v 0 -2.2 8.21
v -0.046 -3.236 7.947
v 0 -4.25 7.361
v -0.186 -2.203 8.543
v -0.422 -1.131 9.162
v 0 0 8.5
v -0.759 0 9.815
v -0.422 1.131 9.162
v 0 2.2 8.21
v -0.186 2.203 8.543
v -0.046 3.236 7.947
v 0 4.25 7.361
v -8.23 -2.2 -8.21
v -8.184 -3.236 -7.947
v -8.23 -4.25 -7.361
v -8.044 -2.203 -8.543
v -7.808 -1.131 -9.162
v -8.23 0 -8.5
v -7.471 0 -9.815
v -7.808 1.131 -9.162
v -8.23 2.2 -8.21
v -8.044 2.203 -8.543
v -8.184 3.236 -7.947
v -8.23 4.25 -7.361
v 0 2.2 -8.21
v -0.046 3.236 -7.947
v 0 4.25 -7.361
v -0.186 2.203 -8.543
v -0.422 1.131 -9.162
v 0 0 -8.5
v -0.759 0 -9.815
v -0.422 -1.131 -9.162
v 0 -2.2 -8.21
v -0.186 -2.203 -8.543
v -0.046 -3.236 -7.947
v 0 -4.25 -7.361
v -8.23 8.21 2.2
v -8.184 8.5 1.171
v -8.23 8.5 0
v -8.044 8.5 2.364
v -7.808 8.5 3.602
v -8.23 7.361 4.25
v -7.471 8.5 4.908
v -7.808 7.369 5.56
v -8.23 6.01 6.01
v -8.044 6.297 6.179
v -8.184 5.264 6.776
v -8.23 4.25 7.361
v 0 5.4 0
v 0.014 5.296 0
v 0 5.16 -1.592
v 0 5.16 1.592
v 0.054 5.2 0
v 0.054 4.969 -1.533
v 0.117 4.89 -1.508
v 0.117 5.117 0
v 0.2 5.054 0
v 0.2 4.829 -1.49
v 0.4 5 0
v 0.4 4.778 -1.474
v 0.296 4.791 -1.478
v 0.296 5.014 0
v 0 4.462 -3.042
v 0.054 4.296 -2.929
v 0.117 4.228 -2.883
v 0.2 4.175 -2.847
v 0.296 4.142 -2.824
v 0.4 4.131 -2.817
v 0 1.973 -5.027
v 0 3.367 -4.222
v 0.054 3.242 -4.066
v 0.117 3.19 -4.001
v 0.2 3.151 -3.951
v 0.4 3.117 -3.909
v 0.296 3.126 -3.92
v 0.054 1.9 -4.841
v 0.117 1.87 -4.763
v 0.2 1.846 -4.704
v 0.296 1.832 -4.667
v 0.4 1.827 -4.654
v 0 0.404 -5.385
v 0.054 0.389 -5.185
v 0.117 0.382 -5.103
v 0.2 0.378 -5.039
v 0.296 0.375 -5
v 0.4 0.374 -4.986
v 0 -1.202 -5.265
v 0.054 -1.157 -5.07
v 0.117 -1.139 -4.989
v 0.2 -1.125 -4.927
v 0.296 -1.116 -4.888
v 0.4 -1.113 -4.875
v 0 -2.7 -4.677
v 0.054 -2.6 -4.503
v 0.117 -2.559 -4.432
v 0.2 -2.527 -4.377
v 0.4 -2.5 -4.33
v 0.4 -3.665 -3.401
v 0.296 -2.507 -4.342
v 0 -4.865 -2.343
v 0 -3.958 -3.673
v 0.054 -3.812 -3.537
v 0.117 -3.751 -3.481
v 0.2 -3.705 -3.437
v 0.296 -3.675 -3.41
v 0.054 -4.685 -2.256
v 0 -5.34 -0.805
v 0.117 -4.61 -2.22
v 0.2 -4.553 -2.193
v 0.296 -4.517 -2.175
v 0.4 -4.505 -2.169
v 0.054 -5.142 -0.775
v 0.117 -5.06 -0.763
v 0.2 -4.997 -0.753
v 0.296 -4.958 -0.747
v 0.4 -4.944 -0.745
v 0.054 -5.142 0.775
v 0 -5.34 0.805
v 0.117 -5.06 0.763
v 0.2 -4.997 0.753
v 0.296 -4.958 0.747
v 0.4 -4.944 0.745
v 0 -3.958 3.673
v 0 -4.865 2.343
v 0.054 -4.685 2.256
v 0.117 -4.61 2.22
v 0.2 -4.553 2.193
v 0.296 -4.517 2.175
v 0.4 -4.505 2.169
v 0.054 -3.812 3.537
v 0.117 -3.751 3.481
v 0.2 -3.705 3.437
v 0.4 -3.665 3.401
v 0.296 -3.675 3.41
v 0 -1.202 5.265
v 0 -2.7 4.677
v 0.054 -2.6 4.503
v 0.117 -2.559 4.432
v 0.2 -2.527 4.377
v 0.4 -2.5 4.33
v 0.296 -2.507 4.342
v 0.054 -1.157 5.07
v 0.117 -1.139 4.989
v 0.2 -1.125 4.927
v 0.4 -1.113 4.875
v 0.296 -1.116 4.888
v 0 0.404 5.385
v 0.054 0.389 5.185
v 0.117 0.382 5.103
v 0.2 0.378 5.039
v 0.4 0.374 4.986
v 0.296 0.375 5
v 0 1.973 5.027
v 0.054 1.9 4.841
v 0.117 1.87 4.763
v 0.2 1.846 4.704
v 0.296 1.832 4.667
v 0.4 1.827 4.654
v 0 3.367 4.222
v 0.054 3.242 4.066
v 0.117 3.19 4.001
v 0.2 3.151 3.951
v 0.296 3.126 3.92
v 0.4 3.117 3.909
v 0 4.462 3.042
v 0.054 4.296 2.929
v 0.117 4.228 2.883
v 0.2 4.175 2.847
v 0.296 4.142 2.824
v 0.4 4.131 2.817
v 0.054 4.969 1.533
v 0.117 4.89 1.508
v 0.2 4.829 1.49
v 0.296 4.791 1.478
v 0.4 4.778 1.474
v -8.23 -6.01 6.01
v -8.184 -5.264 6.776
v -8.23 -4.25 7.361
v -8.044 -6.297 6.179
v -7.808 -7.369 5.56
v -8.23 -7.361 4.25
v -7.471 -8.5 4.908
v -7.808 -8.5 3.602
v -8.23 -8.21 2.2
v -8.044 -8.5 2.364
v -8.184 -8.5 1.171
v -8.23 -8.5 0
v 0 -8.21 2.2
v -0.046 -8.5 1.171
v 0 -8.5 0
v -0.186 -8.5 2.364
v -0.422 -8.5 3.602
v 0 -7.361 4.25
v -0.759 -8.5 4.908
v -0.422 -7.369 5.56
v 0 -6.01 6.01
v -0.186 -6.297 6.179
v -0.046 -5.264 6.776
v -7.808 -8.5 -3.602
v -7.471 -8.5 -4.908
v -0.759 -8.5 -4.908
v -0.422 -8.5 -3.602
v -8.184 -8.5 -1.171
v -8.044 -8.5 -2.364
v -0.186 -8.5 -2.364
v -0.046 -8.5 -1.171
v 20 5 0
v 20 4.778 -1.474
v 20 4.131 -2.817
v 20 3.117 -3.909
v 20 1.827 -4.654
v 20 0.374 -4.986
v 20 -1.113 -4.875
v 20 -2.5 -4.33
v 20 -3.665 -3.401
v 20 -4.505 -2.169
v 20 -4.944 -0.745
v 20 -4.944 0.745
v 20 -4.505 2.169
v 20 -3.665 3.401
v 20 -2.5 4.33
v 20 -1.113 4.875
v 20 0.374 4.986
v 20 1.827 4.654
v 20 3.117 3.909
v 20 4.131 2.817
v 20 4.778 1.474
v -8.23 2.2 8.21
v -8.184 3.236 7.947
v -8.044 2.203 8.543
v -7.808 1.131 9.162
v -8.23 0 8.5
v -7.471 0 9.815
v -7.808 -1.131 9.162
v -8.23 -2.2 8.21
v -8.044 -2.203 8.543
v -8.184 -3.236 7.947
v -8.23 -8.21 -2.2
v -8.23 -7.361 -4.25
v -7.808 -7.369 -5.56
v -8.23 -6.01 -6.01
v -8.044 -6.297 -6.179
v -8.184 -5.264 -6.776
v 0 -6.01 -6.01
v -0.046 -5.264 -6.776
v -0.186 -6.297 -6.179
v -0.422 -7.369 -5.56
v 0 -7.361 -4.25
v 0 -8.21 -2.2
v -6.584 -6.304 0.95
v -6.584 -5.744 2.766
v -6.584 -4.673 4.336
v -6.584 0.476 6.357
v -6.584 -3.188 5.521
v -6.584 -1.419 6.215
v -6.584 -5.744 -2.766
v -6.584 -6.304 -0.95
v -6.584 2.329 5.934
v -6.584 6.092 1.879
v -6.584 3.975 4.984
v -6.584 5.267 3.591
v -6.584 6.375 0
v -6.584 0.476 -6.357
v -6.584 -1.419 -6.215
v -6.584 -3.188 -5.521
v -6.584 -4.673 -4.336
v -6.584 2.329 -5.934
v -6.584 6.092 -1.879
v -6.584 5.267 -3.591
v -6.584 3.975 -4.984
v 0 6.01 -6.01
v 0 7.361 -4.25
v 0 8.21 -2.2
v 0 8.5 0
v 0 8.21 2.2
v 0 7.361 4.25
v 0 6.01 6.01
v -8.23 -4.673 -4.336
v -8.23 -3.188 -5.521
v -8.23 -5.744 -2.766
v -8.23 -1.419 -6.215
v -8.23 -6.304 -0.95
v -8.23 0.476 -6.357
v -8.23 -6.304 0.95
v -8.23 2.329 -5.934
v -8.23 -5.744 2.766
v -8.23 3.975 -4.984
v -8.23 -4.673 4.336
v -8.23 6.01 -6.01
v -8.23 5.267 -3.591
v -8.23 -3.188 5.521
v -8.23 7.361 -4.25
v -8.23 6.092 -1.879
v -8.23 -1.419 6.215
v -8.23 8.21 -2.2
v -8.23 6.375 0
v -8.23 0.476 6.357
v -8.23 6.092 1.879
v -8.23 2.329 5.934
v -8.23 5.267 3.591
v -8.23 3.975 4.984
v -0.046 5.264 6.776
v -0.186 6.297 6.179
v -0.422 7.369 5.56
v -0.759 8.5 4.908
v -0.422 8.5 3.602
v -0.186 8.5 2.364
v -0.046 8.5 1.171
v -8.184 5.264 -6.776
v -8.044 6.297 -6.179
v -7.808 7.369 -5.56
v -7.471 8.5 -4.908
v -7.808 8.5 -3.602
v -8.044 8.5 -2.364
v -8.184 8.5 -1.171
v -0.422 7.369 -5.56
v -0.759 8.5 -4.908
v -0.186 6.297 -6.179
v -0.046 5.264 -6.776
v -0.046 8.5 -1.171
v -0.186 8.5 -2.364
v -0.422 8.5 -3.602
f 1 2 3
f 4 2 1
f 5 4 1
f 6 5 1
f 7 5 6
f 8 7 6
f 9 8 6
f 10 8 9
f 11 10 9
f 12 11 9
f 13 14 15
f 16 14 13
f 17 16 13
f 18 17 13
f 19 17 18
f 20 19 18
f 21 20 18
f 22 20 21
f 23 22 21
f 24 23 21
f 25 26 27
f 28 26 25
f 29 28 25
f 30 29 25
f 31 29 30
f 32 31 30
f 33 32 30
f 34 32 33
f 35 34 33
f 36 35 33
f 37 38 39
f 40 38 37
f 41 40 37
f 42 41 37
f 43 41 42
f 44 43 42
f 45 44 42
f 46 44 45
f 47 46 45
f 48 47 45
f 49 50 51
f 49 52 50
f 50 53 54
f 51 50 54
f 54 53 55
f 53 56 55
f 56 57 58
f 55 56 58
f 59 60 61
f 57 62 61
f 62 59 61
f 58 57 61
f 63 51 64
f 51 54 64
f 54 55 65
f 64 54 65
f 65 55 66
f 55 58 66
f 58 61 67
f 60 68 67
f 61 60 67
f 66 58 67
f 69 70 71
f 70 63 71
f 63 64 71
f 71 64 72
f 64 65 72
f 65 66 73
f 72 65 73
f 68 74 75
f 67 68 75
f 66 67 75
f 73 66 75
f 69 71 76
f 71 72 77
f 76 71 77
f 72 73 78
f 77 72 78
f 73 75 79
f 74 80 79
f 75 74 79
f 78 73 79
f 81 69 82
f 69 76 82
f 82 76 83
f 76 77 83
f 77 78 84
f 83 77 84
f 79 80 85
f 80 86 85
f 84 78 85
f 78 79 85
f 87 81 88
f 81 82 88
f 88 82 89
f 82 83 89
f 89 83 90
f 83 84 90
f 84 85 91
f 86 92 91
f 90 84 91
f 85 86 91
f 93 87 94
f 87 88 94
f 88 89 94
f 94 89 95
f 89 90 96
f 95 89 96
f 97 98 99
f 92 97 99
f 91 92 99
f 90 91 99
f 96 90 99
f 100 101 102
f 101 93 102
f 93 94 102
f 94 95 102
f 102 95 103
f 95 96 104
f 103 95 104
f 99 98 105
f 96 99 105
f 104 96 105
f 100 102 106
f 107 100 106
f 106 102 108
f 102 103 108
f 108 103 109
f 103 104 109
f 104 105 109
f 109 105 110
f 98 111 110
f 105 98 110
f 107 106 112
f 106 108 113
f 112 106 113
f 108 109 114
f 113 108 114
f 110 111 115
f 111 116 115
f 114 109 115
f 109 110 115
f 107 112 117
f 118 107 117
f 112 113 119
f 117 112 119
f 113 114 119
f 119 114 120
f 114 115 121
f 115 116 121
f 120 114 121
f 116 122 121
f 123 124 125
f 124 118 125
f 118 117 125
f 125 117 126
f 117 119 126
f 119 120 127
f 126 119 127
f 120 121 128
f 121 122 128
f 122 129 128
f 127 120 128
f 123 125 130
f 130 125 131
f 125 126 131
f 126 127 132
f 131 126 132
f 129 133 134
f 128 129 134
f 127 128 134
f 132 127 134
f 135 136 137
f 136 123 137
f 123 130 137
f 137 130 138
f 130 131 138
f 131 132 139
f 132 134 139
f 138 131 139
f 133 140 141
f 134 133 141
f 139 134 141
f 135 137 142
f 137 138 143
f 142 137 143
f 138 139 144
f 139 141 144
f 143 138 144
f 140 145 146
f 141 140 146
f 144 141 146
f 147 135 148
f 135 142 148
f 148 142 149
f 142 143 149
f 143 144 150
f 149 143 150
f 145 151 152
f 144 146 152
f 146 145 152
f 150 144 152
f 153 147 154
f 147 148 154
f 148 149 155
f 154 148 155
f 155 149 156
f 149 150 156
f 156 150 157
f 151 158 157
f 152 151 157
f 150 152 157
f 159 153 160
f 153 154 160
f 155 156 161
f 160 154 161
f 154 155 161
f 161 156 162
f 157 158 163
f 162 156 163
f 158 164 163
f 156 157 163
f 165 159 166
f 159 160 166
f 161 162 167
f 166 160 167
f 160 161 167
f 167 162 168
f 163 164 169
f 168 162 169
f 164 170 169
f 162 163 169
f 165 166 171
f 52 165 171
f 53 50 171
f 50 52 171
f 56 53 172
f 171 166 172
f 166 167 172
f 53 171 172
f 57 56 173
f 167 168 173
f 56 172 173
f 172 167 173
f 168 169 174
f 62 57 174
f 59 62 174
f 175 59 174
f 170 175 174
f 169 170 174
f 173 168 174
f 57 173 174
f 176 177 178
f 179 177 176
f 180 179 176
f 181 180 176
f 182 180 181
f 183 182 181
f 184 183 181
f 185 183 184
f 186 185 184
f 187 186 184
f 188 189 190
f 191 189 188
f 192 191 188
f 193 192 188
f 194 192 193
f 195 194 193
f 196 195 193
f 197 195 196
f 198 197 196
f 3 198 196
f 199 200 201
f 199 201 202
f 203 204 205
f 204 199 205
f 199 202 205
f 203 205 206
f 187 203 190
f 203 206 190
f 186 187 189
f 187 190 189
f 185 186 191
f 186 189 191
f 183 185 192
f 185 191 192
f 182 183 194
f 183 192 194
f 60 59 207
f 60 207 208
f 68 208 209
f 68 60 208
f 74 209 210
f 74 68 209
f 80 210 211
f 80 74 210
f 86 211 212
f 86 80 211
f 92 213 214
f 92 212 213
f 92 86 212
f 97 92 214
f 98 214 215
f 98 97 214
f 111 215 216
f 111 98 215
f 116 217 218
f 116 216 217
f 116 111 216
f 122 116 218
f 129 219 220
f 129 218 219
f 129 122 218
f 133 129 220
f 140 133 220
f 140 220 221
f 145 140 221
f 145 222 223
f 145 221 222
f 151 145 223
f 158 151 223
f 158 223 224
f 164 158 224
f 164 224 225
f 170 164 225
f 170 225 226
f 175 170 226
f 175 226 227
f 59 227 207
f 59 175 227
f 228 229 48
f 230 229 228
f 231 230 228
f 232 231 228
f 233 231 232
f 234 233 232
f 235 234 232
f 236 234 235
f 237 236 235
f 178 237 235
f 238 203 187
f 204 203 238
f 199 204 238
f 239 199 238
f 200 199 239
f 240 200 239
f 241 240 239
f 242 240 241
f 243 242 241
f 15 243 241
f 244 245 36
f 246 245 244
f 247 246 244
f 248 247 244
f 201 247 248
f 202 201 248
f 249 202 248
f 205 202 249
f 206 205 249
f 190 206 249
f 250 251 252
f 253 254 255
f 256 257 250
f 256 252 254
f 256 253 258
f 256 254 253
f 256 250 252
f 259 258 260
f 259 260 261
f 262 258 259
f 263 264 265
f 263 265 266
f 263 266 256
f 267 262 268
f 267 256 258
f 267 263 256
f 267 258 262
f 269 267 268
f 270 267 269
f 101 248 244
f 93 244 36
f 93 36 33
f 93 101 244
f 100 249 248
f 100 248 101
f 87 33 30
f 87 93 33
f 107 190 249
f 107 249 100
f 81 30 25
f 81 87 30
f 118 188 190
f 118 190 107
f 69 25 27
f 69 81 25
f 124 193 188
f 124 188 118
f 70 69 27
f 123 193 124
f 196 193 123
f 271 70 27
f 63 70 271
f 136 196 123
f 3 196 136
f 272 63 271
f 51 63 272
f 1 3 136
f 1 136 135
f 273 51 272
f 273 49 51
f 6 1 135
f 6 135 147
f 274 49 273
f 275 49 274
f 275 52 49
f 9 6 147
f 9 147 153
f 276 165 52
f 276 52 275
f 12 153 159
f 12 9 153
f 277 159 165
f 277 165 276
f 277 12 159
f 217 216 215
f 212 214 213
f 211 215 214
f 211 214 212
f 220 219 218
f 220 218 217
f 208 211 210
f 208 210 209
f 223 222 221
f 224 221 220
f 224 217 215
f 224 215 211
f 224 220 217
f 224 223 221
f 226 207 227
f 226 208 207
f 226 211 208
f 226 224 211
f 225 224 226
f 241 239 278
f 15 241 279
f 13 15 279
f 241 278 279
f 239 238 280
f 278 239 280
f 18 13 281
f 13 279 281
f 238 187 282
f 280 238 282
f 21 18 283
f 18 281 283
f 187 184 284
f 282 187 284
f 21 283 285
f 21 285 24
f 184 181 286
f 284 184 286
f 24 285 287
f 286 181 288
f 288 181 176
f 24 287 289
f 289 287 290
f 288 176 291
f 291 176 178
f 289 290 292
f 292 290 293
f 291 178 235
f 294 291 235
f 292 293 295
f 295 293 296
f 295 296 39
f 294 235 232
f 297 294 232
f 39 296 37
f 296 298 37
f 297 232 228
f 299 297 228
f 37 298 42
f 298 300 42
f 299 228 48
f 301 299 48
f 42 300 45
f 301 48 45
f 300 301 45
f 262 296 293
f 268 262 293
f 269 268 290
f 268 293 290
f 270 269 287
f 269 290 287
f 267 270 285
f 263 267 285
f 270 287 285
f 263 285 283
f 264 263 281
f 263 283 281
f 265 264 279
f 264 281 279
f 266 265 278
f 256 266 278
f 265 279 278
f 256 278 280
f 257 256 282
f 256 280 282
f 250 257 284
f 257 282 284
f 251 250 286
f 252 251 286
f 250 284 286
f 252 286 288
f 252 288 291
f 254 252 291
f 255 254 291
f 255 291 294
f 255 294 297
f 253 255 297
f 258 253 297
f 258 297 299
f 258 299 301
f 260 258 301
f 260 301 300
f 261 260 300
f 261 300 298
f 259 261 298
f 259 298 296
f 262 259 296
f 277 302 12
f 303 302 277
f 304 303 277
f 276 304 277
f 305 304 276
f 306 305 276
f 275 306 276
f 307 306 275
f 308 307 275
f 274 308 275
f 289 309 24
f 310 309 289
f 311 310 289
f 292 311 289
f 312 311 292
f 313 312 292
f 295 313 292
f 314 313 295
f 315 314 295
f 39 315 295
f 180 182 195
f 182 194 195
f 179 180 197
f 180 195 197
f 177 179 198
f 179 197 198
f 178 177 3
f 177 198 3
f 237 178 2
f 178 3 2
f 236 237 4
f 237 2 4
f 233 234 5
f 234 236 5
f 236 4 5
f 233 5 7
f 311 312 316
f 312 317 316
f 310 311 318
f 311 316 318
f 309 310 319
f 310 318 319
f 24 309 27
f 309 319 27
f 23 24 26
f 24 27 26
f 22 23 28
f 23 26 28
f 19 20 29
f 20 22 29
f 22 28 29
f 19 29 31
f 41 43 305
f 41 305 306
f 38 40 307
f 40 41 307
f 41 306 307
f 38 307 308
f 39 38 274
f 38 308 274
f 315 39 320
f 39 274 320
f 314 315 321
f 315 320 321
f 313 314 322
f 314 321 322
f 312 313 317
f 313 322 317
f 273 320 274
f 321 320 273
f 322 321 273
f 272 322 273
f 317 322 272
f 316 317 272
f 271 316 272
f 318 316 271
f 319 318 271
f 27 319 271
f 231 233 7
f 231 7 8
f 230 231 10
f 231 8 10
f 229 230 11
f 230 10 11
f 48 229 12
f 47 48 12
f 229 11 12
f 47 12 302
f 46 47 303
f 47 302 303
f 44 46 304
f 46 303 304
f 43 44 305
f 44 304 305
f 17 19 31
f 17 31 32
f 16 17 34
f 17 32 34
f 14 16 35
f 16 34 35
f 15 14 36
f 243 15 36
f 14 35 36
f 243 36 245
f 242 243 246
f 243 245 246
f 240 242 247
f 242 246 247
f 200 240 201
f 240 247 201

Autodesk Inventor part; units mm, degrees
ref_plane "YZ Plane" through (0, 0, 0) normal (1, 0, 0) x (0, 1, 0)
ref_plane "XZ Plane" through (0, 0, 0) normal (0, 1, 0) x (-1, 0, 0)
sketch "Sketch1" plane through (0, 0, 0) normal (0, 0, 1) x (1, 0, 0)
  line L0 (0, 5) -> (0, 0)
  line L1 (0, 0) -> (20, 0)
  line L2 (20, 0) -> (20, 5)
  line L3 (20, 5) -> (0, 5)
  line L4 (-4, 0) -> (24, 0) projected
  line L5 (0, -1) -> (0, 6) projected
  dimension "d0" = 10
  dimension "d1" = 20
revolve "Body" add sketch "Sketch1" angle 360 about axis through (0, 0, 0) along (1, 0, 0)
sketch "Sketch2" plane through (0, 0, 0) normal (1, 0, 0) x (0, 1, 0)
  line L0 (0, 9.815) -> (8.5, 4.9075)
  line L1 (8.5, 4.9075) -> (8.5, -4.9075)
  line L2 (8.5, -4.9075) -> (0, -9.815)
  line L3 (0, -9.815) -> (-8.5, -4.9075)
  line L4 (-8.5, -4.9075) -> (-8.5, 4.9075)
  line L5 (-8.5, 4.9075) -> (0, 9.815)
  line L6 (-11.9, 0) -> (11.9, 0) projected
  line L7 (0, -13.7409) -> (0, 13.7409) projected
  point P0 (0, 0)
  point P1 (0, 0)
  dimension "d2" = 17
extrude "Head" add sketch "Sketch2" against normal blind 8.23
sketch "Sketch3" plane through (-8.23, 0, 0) normal (-1, 0, 0) x (0, 1, 0)
  circle A0 centre (0, 0) radius 6.375
  point P0 (0, 0)
  dimension "d12" = 12.75
extrude "Indent1" cut sketch "Sketch3" against normal blind 1.646
sketch "Sketch4" plane through (0, 0, 0) normal (0, 0, 1) x (1, 0, 0)
  line L0 (-8.23, 9.815) -> (-8.23, 8.5)
  line L1 (-8.23, 8.5) -> (-7.4708, 9.815)
  line L2 (-7.4708, 9.815) -> (-8.23, 9.815)
  line L3 (0, 9.815) -> (0, 8.5)
  line L4 (0, 8.5) -> (-0.7592, 9.815)
  line L5 (-0.7592, 9.815) -> (0, 9.815)
  line L6 (0, 0) -> (-8.23, 0) projected
  line L7 (-8.23, 0) -> (-8.23, 8.5) projected
  line L8 (0, 0) -> (0, 8.5) projected
  line L9 (-9.876, 0) -> (1.646, 0) projected
  line L10 (-7.4708, 9.815) -> (-0.7592, 9.815) construction
  line L11 (0, -1.963) -> (0, 11.7779) projected
  dimension "d6" = 30
  dimension "d7" = 30
  dimension "d16" = 17
  dimension "d17" = 17
  dimension "d18" = 19.6299
revolve "Chamfer1" cut sketch "Sketch4" angle 360 about axis through (-10, 0, 0) along (1, 0, 0)
fillet "Fillet1" radius 0.4 1 edges at (0, -5, 0)
thread "Thread" size "M10x1.5" class "6g" standard "ISO Metric profile" length 17
ref_plane "Work Plane1" through (3, 0, 0) normal (0, 0.5, 0.8660254) x (1, 0, 0)
equation "\"d2\" = SW"
equation "\"d3\" = KOH"
equation "\"d12\" = 0.75 * SW0"
equation "\"d14\" = 0.2 * KOH"
equation "\"d11\" = RR"
equation "\"d8\" = GEL"
equation "\"d0\" = GD"
equation "\"d1\" = NLG"
equation "\"d6\" = ANG1"
equation "\"d7\" = ANG1"
equation "\"d16\" = SW0"
equation "\"d17\" = SW0"
equation "\"d18\" = 1.1547 * SW"
equation "\"NLG\" = 20"
equation "\"KOH\" = 8.23"
equation "\"GD\" = NND"
equation "\"GEL\" = 17"
equation "\"SW\" = 17"
equation "\"SW0\" = SW"
equation "\"ANG1\" = 30deg"
equation "\"RR\" = 0.4"
equation "\"GUL\" = 0.61345 * PTC"
equation "\"SPD\" = NND - 1.2269 * PTC"
equation "\"GD1\" = THREADDIA - 1.2269 * PTC"
equation "\"SDH\" = 11.2"
equation "\"TOA\" = 30deg"
equation "\"FAWI\" = 45deg"
equation "\"PTC\" = 1.5"
equation "\"GAL\" = 0.61345 * PTC"
equation "\"SD\" = 0"
equation "\"SD2\" = SDH"
equation "\"E0\" = 1.155 * SW"
equation "\"NND\" = 10"
equation "\"THREADDIA\" = 10"
properties part number "AS 1427 - M10 x 20" material "Steel, Mild"
